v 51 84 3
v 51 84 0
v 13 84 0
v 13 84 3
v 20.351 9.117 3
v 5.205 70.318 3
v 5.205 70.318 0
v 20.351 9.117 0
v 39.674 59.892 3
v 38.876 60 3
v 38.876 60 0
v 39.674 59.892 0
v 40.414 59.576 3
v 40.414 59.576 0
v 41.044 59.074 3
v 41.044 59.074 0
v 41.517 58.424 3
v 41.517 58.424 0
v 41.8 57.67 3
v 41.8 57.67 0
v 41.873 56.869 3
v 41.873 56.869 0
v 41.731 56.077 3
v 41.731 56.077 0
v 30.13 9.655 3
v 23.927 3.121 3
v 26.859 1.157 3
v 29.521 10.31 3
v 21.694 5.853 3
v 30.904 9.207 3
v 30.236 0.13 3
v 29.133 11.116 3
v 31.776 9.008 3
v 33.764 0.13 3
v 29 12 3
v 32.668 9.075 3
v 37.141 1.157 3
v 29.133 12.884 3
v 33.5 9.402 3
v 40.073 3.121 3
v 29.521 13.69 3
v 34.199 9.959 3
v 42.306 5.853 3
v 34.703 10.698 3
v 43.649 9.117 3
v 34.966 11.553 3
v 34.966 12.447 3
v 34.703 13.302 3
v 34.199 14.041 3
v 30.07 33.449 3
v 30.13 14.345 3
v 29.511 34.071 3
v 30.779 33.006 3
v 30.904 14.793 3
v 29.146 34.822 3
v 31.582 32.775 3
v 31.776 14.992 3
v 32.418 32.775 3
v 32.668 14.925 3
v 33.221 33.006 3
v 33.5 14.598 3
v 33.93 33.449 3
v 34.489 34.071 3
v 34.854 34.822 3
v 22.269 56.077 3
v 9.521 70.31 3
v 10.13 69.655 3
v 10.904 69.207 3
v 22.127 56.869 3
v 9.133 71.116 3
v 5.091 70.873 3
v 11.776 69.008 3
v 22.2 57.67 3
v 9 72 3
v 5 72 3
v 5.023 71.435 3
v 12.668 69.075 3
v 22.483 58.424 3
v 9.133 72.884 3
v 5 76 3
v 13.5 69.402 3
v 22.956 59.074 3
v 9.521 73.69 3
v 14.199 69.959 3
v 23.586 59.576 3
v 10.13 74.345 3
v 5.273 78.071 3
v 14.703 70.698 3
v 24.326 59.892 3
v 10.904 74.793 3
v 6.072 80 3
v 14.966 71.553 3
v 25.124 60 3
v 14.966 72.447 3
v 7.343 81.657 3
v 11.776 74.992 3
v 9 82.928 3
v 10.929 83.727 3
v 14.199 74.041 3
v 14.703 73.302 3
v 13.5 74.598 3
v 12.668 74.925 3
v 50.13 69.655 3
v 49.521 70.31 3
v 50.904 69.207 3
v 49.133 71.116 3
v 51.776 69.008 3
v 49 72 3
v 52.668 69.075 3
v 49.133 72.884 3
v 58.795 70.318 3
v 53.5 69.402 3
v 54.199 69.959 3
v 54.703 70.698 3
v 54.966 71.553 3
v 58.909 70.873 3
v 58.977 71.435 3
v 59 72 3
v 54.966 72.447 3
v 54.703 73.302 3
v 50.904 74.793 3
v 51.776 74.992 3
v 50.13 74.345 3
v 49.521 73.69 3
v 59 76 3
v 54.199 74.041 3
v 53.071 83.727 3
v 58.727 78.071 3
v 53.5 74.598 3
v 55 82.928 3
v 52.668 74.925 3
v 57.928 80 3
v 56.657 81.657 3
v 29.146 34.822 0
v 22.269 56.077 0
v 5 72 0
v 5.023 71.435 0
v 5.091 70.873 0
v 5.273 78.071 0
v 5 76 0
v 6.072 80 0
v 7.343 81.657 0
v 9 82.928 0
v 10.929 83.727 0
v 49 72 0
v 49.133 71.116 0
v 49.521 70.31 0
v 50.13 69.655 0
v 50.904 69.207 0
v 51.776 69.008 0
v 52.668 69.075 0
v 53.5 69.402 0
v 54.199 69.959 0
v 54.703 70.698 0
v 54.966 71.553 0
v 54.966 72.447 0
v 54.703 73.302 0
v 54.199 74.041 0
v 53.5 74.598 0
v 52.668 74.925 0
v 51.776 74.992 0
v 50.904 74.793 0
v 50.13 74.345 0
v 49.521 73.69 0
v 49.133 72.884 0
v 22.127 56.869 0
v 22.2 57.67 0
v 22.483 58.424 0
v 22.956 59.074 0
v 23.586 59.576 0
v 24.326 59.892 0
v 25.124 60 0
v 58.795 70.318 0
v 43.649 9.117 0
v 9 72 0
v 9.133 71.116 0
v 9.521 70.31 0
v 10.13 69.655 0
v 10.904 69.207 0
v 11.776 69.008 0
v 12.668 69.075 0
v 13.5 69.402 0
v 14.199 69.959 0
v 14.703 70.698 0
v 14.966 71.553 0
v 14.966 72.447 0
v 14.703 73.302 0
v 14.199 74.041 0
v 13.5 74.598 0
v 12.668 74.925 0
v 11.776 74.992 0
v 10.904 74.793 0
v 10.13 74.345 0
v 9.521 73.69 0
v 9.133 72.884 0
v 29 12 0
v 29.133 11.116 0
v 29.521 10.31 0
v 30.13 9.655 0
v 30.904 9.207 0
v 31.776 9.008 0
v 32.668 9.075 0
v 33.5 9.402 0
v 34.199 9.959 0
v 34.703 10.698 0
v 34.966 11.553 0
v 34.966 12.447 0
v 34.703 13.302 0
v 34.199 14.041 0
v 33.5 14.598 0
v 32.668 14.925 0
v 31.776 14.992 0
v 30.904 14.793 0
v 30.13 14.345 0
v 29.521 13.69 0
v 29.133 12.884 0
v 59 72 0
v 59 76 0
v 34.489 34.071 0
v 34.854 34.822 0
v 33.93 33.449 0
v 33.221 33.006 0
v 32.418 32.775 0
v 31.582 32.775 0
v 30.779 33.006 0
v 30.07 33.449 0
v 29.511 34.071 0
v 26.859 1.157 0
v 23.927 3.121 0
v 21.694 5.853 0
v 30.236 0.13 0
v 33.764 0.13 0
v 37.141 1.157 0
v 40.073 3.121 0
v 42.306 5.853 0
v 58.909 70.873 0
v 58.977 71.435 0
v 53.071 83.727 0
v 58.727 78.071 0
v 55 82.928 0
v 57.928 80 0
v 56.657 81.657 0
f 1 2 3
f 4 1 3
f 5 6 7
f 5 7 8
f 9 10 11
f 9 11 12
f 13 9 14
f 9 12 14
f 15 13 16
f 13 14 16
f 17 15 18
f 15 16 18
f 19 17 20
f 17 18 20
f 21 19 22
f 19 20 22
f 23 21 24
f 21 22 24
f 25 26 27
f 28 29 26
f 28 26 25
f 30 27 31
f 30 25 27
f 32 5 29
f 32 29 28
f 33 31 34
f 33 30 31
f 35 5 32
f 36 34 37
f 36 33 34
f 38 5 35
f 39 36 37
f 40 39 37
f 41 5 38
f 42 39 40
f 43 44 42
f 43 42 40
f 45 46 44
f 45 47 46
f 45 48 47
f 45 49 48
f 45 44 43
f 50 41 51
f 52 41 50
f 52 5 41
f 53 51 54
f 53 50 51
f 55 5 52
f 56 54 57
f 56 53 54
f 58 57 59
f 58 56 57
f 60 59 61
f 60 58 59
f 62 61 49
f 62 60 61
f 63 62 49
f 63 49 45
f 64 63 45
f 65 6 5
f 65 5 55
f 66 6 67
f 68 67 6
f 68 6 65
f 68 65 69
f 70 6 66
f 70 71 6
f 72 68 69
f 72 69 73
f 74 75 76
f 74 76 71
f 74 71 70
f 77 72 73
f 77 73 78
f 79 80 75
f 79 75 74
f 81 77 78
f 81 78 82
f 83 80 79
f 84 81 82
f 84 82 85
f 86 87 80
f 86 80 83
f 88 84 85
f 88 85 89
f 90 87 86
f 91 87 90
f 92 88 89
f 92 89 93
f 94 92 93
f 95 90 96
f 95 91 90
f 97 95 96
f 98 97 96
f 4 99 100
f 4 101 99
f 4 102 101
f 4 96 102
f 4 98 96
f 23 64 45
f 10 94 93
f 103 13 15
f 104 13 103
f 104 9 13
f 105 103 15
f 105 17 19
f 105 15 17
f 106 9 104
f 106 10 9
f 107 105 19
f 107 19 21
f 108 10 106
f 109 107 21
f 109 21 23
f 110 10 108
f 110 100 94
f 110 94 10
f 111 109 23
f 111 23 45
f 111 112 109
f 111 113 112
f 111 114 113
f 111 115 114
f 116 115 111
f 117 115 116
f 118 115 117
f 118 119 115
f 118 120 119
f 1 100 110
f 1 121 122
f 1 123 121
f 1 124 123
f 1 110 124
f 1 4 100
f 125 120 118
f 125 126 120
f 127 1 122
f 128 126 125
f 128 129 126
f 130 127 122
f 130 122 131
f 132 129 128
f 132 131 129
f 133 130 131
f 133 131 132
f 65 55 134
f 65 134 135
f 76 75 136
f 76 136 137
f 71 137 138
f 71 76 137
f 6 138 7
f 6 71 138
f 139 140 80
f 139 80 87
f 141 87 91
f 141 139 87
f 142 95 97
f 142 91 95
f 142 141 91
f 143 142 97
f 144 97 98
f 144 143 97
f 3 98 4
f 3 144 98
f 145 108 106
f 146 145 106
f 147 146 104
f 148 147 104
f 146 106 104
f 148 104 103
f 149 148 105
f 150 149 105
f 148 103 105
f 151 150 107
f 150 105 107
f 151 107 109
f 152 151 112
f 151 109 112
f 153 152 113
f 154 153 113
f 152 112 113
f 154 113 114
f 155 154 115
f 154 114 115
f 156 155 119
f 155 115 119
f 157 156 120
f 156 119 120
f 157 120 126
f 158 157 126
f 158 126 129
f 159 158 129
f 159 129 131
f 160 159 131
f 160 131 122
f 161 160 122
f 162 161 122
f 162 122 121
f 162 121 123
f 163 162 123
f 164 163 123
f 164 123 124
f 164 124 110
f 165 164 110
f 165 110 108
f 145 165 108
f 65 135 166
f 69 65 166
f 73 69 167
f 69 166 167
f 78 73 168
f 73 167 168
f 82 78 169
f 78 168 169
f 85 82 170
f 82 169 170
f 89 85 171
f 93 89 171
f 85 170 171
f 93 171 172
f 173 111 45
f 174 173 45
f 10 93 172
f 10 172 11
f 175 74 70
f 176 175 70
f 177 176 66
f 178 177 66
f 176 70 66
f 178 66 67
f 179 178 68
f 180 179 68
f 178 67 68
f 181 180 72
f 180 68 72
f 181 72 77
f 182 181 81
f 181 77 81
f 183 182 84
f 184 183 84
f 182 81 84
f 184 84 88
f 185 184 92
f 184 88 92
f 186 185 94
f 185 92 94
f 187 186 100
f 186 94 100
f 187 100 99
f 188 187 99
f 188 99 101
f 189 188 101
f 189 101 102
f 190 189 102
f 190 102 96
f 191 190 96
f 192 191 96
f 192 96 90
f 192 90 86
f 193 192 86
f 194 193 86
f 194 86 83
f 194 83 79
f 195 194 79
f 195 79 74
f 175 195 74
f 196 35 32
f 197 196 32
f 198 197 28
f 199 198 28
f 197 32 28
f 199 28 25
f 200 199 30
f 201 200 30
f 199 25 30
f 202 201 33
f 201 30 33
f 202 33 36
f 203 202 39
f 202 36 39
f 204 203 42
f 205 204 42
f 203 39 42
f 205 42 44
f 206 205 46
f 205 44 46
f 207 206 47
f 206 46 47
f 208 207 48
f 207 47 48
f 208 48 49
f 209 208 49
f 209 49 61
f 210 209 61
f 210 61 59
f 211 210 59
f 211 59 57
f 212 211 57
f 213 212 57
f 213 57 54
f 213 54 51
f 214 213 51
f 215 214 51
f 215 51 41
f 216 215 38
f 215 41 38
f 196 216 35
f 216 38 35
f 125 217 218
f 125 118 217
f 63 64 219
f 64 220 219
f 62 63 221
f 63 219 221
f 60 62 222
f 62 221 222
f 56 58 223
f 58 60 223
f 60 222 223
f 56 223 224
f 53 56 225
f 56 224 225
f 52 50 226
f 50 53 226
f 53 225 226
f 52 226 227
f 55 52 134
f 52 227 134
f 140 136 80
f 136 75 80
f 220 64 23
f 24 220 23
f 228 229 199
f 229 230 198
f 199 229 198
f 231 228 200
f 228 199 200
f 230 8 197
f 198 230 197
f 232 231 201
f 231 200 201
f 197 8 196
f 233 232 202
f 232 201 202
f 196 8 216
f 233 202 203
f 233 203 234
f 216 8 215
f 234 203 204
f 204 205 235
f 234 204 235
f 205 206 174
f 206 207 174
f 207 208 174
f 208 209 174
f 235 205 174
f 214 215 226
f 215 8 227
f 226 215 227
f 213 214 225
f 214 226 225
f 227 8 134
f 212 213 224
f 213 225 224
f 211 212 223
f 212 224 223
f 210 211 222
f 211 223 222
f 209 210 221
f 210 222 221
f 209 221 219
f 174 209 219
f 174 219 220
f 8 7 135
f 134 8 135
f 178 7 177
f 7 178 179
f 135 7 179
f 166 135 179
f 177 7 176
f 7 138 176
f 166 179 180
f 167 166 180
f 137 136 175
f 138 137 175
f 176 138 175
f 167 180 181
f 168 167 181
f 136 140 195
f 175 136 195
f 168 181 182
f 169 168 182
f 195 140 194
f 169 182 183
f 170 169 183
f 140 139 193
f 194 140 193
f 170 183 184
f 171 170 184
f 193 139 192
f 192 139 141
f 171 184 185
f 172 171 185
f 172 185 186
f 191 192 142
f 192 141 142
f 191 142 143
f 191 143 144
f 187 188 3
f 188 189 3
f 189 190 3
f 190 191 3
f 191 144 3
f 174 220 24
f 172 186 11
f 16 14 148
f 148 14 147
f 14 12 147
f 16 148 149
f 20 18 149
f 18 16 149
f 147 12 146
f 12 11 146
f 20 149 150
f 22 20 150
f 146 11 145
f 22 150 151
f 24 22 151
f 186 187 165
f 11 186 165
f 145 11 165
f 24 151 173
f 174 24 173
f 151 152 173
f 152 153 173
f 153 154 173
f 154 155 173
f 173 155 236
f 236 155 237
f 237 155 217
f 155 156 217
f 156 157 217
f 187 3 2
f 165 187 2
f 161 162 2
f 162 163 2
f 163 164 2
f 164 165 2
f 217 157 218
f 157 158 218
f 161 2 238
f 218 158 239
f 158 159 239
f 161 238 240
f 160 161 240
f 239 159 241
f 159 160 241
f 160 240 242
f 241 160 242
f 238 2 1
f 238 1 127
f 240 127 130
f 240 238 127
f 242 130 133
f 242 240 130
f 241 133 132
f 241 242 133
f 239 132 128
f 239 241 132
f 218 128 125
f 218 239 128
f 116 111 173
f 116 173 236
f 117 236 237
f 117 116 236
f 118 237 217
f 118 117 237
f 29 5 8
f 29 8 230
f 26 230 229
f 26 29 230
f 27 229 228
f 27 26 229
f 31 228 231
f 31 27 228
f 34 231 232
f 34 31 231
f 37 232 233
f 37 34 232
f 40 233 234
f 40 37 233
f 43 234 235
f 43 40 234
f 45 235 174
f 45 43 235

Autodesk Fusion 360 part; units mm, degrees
sketch "Sketch1" plane through (0, 0, 0) normal (0, 0, 1) x (1, 0, 0) in component "X Axis Support - Inside Support V2"
  line L0 (0, 0) -> (64, 0)
  line L1 (64, 0) -> (64, 84)
  line L2 (64, 84) -> (0, 84)
  line L3 (0, 84) -> (0, 0)
  dimension "d1" = 64
  dimension "d2" = 84
extrude "Extrude1" add sketch "Sketch1" along normal blind 3 in component "X Axis Support - Inside Support V2"
sketch "Sketch2" plane through (0, 0, 3) normal (0, 0, 1) x (-1, 0, 0) in component "X Axis Support - Inside Support V2"
  line L0 (0, -84) -> (0, 0)
  line L1 (0, 0) -> (-64, 0)
  line L2 (-64, 0) -> (-64, -84)
  line L3 (-64, -84) -> (0, -84)
  line L4 (-12, -84) -> (-12, 0) construction
  line L5 (-52, -84) -> (-52, 0) construction
  line L6 (0, -12) -> (-64, -12) construction
  line L7 (0, -72) -> (-64, -72) construction
  circle A0 centre (-12, -72) radius 12 construction
  circle A1 centre (-52, -72) radius 12 construction
  circle A2 centre (-12, -72) radius 3
  circle A3 centre (-52, -72) radius 3
  line L8 (0, -72) -> (0, 0)
  line L9 (0, 0) -> (-32, 0)
  line L10 (-32, 0) -> (-64, 0)
  line L11 (-64, 0) -> (-64, -72)
  circle A4 centre (-32, -12) radius 12
  circle A5 centre (-32, -12) radius 3
  line L12 (0, -26) -> (-64, -26) construction
  line L13 (-12, 0) -> (0, -26)
  line L14 (-52, 0) -> (-64, -26)
  line L15 (0, -85) -> (-64, -85) construction
  line L16 (-32, -85) -> (-32, 0) construction
  line L17 (-5.205, -70.3183) -> (-20.3514, -9.1171)
  line L18 (0, -60) -> (-64, -60) construction
  line L19 (0, -26) -> (-64, -26) construction
  line L20 (-21, -60) -> (-21, -26) construction
  line L21 (-43, -60) -> (-43, -26) construction
  line L22 (-21, -60) -> (-43, -60)
  line L23 (-32, -26) -> (-43, -60)
  line L24 (-32, -26) -> (-21, -60)
  circle A6 centre (-12, -72) radius 5 construction
  circle A7 centre (-52, -72) radius 5 construction
  circle A8 centre (-12, -72) radius 7
  circle A9 centre (-52, -72) radius 7
  line L25 (-58.795, -70.3183) -> (-43.6486, -9.1171)
  line L26 (-5, -72) -> (-5, -84)
  line L27 (-59, -72) -> (-59, -84)
  dimension "d8" = 12
  dimension "d13" = 24
  dimension "d14" = 24
  dimension "d16" = 6
  dimension "d17" = 6
  dimension "d40" = 60
  dimension "d53" = 24
  dimension "d55" = 6
  dimension "d57" = 26
  dimension "d234" = 13
  dimension "d238" = 20
  dimension "d241" = 20
  dimension "d242" = 60
  dimension "d243" = 14
  dimension "d244" = 11
  dimension "d245" = 11
  dimension "d248" = 10
  dimension "d249" = 10
  dimension "d250" = 14
  dimension "d251" = 14
extrude "Extrude2" cut sketch "Sketch2" against normal up to surface (3 mm away) contours L0 L1 L3 L8 L9 A4 L13 L17 A8 L26 | L0 L1 L8 L9 L13 | L1 L2 L3 L10 L11 A4 L14 A9 L25 L27 | L1 L2 L10 L11 L14 | A2 | A3 | A5 | L22 L23 L24 in component "X Axis Support - Inside Support V2"
fillet "Fillet11" radius 3 3 edges at (21, 60, 1.5) (43, 60, 1.5) (32, 26, 1.5) in component "X Axis Support - Inside Support V2"
fillet "Fillet11" radius 8 2 edges at (59, 84, 1.5) (5, 84, 1.5) in component "X Axis Support - Inside Support V2"
component "X Axis Support - Inside Support V2" placed x (1, 0, 0) y (0, 1, 0) z (0, 0, 1) at (0, 0, 0)
